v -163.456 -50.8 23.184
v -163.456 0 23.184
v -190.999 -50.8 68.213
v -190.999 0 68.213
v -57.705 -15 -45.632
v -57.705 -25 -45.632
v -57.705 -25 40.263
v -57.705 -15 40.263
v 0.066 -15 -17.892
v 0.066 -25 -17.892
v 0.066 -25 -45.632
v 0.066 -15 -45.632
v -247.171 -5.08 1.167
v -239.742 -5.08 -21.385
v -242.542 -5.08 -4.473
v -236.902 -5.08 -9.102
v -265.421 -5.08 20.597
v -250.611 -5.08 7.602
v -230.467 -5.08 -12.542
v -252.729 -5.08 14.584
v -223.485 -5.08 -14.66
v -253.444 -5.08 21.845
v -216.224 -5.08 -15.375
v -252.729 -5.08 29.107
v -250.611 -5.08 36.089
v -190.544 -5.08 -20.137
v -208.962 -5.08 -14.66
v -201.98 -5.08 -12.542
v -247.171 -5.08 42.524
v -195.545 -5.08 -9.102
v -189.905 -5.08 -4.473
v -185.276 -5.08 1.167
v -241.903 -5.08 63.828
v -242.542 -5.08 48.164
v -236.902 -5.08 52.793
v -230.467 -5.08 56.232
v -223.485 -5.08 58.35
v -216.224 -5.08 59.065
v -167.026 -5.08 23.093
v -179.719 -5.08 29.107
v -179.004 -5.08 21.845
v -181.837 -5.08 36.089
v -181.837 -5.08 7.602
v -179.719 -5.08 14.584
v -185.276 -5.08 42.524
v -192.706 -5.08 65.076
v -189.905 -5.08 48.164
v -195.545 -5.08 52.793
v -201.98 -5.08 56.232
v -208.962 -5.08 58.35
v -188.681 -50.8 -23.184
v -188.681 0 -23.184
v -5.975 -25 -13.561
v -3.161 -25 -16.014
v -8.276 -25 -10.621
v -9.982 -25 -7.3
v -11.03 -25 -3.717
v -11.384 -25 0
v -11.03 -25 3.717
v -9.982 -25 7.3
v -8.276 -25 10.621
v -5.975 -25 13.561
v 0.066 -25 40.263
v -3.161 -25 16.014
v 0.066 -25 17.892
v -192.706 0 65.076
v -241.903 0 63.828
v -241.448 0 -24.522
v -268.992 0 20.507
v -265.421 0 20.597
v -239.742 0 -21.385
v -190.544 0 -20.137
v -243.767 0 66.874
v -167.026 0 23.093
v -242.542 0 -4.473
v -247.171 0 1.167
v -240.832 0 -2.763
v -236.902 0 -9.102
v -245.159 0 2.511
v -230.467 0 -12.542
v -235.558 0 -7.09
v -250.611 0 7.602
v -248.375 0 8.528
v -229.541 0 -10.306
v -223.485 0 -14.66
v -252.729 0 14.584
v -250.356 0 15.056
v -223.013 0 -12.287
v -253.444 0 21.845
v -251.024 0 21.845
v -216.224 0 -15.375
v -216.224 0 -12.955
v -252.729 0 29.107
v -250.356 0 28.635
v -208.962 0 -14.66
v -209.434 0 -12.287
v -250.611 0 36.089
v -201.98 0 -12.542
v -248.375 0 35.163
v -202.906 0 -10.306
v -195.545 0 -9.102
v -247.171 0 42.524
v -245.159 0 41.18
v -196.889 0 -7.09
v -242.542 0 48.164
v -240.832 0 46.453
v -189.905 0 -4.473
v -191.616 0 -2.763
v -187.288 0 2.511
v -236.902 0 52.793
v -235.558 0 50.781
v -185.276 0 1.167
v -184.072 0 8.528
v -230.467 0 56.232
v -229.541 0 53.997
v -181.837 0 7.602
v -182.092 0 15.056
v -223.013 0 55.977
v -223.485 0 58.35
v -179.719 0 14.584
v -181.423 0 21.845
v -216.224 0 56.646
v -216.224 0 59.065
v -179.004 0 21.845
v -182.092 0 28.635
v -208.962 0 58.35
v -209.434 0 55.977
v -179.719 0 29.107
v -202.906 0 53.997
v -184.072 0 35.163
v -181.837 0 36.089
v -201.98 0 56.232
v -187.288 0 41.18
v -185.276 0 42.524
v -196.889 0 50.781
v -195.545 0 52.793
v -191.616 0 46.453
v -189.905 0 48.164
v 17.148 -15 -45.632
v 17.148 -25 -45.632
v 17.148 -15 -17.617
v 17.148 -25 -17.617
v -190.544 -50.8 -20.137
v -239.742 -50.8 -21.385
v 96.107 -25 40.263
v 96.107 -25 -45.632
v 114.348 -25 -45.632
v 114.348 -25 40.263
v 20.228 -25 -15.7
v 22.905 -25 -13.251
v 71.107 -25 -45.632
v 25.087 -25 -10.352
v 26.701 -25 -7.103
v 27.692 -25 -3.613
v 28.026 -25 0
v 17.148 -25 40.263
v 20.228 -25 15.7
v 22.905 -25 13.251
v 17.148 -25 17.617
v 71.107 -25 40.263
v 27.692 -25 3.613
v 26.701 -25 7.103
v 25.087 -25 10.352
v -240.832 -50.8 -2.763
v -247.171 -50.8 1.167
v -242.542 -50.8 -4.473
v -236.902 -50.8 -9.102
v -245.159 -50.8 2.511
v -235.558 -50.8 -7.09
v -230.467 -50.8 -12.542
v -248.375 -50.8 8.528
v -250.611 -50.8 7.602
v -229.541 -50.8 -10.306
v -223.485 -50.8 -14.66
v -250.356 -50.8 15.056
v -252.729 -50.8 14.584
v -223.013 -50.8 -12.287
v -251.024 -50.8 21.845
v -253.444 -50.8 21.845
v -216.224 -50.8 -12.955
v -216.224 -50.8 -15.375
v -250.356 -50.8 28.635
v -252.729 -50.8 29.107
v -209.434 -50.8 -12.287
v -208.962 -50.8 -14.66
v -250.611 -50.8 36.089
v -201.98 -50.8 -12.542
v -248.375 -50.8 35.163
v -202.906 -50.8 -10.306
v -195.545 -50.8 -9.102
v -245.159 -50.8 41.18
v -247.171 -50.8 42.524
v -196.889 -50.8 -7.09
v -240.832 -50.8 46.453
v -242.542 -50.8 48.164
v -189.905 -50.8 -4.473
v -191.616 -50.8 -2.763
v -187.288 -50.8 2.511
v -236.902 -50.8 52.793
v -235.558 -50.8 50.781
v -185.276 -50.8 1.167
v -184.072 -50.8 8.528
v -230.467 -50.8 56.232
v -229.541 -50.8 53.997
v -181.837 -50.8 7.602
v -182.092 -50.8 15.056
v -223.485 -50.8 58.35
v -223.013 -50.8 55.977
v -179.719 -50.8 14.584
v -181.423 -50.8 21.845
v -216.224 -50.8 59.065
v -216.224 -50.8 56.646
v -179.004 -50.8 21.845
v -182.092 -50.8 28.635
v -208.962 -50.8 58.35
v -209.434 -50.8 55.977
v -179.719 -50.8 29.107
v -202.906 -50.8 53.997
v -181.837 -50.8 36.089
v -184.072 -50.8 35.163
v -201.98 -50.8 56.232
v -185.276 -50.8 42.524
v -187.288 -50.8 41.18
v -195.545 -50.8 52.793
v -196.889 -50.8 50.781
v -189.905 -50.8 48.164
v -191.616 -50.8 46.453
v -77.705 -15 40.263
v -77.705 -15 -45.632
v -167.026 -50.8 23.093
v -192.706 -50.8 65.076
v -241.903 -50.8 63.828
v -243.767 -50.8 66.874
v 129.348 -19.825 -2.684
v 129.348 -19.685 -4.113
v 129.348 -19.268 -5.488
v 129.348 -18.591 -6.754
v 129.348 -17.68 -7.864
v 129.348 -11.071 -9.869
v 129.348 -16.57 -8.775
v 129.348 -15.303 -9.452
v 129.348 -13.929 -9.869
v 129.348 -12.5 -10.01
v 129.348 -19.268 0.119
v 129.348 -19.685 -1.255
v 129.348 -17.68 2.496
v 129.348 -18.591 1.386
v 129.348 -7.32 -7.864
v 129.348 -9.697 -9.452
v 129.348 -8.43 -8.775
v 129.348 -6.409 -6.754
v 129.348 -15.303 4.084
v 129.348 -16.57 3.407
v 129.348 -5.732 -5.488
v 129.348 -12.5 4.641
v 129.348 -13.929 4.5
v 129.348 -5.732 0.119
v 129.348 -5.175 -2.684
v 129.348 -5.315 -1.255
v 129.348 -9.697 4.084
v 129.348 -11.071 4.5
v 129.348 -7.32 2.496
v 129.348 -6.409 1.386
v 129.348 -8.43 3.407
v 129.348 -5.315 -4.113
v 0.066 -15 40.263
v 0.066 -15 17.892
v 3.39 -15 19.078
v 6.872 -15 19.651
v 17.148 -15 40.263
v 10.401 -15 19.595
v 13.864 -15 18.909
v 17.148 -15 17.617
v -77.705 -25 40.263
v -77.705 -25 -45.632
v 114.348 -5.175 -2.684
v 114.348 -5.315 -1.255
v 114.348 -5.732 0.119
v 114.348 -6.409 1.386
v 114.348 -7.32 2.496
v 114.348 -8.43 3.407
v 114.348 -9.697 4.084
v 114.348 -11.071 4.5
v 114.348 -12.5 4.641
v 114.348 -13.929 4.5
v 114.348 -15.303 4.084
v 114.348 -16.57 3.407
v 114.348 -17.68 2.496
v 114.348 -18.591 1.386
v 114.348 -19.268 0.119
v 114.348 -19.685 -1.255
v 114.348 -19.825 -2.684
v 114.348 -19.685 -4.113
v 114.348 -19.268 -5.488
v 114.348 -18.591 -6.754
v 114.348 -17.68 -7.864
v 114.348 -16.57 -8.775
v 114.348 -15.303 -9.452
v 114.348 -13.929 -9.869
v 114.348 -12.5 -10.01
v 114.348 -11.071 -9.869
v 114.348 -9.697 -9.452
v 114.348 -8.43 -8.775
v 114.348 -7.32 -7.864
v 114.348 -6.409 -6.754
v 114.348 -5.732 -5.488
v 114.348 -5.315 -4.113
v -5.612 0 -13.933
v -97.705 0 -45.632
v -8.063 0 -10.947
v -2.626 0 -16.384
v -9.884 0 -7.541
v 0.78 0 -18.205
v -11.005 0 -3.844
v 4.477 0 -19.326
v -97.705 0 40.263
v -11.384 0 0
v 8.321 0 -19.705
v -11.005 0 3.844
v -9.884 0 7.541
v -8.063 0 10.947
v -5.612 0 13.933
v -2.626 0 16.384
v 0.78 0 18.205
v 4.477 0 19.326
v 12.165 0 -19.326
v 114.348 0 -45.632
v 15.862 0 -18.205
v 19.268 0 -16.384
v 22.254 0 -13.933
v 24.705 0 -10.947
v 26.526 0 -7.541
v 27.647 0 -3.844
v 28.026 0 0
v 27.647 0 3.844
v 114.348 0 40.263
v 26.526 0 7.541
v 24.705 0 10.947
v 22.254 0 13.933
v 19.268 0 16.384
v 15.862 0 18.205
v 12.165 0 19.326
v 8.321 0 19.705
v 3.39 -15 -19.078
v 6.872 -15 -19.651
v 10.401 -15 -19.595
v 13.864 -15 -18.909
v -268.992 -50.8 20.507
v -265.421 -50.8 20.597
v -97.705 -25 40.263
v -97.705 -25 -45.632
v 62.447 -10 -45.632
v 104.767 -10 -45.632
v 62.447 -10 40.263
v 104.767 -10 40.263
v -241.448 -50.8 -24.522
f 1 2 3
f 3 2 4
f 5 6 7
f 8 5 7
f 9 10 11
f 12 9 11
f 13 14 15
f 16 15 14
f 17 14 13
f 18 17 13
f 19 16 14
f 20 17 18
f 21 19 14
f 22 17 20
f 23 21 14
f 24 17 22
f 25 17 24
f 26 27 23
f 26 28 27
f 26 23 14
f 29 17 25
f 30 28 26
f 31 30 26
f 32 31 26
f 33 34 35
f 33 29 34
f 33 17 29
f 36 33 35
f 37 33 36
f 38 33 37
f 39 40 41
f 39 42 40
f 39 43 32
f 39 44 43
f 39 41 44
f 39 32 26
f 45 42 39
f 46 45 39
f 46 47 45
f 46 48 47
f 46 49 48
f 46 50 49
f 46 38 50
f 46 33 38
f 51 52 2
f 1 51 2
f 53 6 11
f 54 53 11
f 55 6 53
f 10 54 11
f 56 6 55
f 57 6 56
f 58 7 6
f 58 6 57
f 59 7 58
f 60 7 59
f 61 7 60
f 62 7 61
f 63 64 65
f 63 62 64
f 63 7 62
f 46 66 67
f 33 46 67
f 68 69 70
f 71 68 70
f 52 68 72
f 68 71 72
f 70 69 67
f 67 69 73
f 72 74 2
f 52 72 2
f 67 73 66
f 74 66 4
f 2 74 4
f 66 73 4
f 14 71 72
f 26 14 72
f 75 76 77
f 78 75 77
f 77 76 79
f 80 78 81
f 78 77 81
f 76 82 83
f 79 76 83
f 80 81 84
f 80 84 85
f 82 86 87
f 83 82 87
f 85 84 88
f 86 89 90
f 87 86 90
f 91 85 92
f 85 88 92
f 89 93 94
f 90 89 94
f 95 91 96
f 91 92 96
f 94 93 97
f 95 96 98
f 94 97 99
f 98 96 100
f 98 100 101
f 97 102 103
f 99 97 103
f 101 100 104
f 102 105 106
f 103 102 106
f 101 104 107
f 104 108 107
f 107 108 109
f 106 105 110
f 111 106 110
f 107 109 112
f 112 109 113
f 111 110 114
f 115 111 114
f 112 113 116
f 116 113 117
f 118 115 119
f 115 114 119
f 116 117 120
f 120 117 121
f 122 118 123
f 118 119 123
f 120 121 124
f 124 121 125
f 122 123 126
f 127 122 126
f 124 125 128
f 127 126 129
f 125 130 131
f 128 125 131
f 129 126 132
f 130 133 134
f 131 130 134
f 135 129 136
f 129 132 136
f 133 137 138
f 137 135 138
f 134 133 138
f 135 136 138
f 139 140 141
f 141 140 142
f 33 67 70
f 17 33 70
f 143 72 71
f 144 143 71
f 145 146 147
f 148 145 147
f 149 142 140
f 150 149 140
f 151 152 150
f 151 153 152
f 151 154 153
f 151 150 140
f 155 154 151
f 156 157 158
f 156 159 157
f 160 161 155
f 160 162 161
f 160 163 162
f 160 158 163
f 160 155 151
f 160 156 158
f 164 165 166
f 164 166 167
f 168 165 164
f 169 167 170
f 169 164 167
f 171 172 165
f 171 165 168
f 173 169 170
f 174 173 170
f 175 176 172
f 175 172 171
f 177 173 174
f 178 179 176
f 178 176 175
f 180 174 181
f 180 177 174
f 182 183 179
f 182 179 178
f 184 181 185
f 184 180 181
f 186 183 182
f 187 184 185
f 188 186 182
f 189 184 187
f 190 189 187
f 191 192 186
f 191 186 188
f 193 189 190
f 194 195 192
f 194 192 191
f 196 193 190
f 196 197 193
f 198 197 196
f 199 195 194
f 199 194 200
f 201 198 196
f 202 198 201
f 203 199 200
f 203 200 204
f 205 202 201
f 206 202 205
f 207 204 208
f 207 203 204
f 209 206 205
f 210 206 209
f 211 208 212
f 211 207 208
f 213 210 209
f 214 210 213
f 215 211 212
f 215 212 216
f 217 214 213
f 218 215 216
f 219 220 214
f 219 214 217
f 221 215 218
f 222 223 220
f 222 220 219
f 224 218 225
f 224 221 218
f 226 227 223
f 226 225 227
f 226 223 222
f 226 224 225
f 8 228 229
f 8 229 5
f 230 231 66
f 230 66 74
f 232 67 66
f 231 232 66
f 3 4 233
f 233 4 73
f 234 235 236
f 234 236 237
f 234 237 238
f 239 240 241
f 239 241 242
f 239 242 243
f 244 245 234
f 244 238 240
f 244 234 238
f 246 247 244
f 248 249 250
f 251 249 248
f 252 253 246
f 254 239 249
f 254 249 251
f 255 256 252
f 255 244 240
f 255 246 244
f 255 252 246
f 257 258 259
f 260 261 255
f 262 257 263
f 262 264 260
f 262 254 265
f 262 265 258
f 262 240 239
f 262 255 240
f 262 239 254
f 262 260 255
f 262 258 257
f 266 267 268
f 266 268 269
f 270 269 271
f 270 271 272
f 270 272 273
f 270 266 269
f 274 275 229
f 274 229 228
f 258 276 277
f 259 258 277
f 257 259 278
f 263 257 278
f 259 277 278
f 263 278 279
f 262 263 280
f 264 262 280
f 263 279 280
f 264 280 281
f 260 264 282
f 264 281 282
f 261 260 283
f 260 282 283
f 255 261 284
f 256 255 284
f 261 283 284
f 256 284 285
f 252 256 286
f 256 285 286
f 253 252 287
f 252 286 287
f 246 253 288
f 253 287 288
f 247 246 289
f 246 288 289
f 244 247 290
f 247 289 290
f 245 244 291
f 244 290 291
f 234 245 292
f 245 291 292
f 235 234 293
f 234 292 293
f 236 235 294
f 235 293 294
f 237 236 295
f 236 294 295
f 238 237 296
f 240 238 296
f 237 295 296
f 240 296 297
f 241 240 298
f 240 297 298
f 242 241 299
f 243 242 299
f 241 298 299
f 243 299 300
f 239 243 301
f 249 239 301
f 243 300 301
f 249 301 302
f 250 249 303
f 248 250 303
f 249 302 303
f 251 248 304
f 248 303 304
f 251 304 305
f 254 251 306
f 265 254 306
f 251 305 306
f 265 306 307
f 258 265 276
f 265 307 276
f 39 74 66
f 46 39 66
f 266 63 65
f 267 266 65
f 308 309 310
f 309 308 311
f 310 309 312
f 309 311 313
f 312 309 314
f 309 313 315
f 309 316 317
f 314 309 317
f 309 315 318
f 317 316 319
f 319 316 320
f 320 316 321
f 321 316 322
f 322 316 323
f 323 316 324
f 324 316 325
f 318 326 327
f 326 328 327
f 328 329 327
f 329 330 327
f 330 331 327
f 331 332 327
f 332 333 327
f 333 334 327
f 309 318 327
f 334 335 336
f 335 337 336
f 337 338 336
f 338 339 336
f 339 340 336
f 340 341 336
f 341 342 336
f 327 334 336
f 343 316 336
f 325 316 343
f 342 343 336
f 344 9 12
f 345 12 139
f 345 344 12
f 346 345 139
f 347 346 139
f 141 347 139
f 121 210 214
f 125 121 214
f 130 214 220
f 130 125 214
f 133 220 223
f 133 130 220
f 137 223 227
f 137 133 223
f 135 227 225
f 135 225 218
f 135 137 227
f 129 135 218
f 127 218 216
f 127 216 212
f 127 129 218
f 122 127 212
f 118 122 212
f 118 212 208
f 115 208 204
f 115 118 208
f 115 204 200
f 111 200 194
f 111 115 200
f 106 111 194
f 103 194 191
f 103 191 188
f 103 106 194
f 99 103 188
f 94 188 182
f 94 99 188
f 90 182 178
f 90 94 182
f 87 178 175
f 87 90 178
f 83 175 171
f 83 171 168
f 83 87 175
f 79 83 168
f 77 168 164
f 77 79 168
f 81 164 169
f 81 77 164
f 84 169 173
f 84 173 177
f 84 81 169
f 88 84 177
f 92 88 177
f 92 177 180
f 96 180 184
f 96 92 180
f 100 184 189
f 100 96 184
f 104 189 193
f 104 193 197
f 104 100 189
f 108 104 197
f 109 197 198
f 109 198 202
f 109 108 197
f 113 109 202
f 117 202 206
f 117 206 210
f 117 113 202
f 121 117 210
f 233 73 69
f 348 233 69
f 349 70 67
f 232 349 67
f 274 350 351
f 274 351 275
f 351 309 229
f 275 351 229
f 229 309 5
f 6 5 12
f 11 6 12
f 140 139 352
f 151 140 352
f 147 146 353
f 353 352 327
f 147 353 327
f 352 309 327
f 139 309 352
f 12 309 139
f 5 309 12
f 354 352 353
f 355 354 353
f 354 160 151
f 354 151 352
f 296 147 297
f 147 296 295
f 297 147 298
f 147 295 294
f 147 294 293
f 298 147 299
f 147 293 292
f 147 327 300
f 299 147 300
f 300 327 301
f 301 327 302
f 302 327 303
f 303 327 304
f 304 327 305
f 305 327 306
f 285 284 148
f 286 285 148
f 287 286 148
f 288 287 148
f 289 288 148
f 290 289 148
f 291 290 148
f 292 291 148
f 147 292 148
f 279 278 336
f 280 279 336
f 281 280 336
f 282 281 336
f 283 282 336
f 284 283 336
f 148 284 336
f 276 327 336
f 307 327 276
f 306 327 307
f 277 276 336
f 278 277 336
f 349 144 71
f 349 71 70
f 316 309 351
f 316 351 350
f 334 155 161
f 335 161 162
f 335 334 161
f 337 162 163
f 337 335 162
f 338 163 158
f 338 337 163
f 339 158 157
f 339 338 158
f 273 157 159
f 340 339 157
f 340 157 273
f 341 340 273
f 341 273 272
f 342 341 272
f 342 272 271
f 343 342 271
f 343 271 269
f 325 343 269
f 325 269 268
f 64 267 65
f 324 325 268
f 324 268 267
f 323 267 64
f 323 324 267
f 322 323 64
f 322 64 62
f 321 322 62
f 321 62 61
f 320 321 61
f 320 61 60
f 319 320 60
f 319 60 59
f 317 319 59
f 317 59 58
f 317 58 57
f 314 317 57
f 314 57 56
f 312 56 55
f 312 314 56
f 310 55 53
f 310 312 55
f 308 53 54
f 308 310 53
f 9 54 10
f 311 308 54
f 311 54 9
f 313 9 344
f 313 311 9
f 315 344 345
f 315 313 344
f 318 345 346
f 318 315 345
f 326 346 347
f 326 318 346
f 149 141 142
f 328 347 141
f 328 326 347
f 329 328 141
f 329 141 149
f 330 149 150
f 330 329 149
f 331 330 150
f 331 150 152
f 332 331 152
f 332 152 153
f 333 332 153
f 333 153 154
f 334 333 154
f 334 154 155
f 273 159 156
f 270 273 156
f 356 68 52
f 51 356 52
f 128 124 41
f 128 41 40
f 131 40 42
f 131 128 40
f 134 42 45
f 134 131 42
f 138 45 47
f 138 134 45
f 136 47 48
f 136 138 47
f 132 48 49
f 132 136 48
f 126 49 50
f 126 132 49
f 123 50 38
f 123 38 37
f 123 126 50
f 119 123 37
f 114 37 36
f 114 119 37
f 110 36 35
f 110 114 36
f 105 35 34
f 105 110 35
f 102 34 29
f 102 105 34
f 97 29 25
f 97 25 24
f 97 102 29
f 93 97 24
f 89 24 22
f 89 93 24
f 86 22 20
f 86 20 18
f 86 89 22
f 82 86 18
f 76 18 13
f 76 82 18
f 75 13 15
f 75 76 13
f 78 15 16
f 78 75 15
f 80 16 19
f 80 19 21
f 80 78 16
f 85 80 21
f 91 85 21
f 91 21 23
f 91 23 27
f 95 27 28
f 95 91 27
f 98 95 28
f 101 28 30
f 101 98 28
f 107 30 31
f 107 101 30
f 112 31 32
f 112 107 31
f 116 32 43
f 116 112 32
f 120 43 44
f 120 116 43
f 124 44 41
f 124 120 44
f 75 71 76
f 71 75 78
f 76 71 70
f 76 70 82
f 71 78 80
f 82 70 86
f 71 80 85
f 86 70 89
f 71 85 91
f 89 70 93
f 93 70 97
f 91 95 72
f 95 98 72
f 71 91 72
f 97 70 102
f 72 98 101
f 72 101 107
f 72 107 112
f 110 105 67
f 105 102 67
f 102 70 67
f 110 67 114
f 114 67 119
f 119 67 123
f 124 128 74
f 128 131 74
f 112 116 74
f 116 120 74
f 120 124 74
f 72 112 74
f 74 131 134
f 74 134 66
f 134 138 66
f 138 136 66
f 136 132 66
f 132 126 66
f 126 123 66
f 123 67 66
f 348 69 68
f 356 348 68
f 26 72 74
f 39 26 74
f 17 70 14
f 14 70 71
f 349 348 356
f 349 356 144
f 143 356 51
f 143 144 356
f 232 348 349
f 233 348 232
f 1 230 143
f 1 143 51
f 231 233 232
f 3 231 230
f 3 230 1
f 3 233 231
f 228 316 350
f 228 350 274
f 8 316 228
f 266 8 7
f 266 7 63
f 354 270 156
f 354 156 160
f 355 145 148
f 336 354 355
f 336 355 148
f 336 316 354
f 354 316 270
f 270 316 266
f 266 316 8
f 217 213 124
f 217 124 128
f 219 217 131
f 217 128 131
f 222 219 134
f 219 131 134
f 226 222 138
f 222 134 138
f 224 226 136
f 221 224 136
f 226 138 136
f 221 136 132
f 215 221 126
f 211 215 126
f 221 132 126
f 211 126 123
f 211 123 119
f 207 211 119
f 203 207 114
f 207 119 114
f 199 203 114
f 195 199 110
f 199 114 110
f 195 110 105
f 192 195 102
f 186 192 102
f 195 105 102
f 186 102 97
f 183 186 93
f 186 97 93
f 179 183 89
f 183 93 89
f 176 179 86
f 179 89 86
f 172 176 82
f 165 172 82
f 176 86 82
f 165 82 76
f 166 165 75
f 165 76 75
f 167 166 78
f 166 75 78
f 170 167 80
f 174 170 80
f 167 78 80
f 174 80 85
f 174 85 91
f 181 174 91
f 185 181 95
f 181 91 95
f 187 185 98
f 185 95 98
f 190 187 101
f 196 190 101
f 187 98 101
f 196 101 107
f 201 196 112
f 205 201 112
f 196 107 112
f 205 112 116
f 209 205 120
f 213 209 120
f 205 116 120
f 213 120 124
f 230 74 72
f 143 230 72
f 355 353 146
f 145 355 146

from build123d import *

# Parameters (mm, degrees)
F1_DEPTH  = 50.8
F0_R      = 37.2201453229
F0_R_2    = 34.8006762107
F2_DEPTH  = 50.8
F3_DEPTH  = 5.08
F4_W      = 212.0530977845
F4_H      = 85.894934833
F4_R      = 19.7047808414
F5_DEPTH  = 25
F6_W      = 20
F6_H      = 85.894934833
F7_DEPTH  = 10
F9_DEPTH  = 113.8456119818
F10_R     = 7.3254233904
F11_DEPTH = 15


with BuildPart() as f1:
    # F0 (on Front) → F1 (new body)
    with BuildSketch(Plane.XZ):
        Polygon((-188.680538046, -23.1838232474), (-163.4557758693, 23.1838232474), (-190.9989545592, 68.2129313442), (-243.7668954257, 66.8743929462), (-268.9916576024, 20.5067464514), (-241.4484789125, -24.5223616454), align=None)
        Polygon((-192.705711989, 65.075604435), (-167.0261593876, 23.0932550851), (-190.5441641345, -20.1370645005), (-239.7417214827, -21.3850347361), (-265.4212740841, 20.5973146137), (-241.9032693372, 63.8276341993), align=None, mode=Mode.SUBTRACT)
    extrude(amount=F1_DEPTH)


with BuildPart() as f2:
    # F0 (on Front) → F2 (new body)
    with BuildSketch(Plane.XZ):
        with Locations((-216.2237167358, 21.8452848494)):
            Circle(F0_R)
        with Locations((-216.2237167358, 21.8452848494)):
            Circle(F0_R_2, mode=Mode.SUBTRACT)
    extrude(amount=F2_DEPTH)


with BuildPart() as f3:
    # F0 (on Front) → F3 (new body)
    with BuildSketch(Plane.XZ):
        Polygon((-190.5441641345, -20.1370645005), (-167.0261593876, 23.0932550851), (-192.705711989, 65.075604435), (-241.9032693372, 63.8276341993), (-265.4212740841, 20.5973146137), (-239.7417214827, -21.3850347361), align=None)
        with Locations((-216.2237167358, 21.8452848494)):
            Circle(F0_R, mode=Mode.SUBTRACT)
    extrude(amount=F3_DEPTH)


with BuildPart() as f5:
    # F4 (on Front) → F5 (new body)
    with BuildSketch(Plane.XZ):
        with Locations((8.3210729063, -2.6842132211)):
            Rectangle(F4_W, F4_H)
        with Locations((8.3210729063, 0)):
            Circle(F4_R, mode=Mode.SUBTRACT)
    extrude(amount=F5_DEPTH)

    # F6 (on face) → F7 (cut)
    with BuildSketch(Plane.XZ.offset(25)):
        with Locations((-67.705475986, -2.6842132211)):
            Rectangle(F6_W, F6_H)
        with BuildLine():
            Line((0.065697066, -17.892097634), (0.065697066, -45.6316806376))
            Line((0.065697066, -45.6316806376), (17.1479461715, -45.6316806376))
            Line((17.1479461715, -45.6316806376), (17.1479461715, -17.6171704984))
            ThreePointArc((17.1479461715, -17.6171704984), (8.6381668342, -19.7022293015), (0.065697066, -17.892097634))
        make_face()
        with BuildLine():
            Line((17.1479461715, 40.2632541955), (0.065697066, 40.2632541955))
            Line((0.065697066, 40.2632541955), (0.065697066, 17.892097634))
            ThreePointArc((0.065697066, 17.892097634), (8.6381668342, 19.7022293015), (17.1479461715, 17.6171704984))
            Line((17.1479461715, 17.6171704984), (17.1479461715, 40.2632541955))
        make_face()
    extrude(amount=-F7_DEPTH, mode=Mode.SUBTRACT)

    # F8 (on face) → F9 (cut, through all)
    with BuildSketch(Plane(origin=(0, 0, -45.6316806376), x_dir=(1, 0, 0), z_dir=(0, 0, -1))):
        Polygon((96.1068216187, 25), (71.1068216187, 25), (62.4465675809, 10), (104.7670756566, 10), align=None)
    extrude(amount=-F9_DEPTH, mode=Mode.SUBTRACT)

    # F10 (on face) → F11 (join)
    with BuildSketch(Plane.YZ.offset(114.3476217985)):
        with Locations((-12.5, -2.6842132211)):
            Circle(F10_R)
    extrude(amount=F11_DEPTH)


solid = Compound([f1.part, f2.part, f3.part, f5.part])
